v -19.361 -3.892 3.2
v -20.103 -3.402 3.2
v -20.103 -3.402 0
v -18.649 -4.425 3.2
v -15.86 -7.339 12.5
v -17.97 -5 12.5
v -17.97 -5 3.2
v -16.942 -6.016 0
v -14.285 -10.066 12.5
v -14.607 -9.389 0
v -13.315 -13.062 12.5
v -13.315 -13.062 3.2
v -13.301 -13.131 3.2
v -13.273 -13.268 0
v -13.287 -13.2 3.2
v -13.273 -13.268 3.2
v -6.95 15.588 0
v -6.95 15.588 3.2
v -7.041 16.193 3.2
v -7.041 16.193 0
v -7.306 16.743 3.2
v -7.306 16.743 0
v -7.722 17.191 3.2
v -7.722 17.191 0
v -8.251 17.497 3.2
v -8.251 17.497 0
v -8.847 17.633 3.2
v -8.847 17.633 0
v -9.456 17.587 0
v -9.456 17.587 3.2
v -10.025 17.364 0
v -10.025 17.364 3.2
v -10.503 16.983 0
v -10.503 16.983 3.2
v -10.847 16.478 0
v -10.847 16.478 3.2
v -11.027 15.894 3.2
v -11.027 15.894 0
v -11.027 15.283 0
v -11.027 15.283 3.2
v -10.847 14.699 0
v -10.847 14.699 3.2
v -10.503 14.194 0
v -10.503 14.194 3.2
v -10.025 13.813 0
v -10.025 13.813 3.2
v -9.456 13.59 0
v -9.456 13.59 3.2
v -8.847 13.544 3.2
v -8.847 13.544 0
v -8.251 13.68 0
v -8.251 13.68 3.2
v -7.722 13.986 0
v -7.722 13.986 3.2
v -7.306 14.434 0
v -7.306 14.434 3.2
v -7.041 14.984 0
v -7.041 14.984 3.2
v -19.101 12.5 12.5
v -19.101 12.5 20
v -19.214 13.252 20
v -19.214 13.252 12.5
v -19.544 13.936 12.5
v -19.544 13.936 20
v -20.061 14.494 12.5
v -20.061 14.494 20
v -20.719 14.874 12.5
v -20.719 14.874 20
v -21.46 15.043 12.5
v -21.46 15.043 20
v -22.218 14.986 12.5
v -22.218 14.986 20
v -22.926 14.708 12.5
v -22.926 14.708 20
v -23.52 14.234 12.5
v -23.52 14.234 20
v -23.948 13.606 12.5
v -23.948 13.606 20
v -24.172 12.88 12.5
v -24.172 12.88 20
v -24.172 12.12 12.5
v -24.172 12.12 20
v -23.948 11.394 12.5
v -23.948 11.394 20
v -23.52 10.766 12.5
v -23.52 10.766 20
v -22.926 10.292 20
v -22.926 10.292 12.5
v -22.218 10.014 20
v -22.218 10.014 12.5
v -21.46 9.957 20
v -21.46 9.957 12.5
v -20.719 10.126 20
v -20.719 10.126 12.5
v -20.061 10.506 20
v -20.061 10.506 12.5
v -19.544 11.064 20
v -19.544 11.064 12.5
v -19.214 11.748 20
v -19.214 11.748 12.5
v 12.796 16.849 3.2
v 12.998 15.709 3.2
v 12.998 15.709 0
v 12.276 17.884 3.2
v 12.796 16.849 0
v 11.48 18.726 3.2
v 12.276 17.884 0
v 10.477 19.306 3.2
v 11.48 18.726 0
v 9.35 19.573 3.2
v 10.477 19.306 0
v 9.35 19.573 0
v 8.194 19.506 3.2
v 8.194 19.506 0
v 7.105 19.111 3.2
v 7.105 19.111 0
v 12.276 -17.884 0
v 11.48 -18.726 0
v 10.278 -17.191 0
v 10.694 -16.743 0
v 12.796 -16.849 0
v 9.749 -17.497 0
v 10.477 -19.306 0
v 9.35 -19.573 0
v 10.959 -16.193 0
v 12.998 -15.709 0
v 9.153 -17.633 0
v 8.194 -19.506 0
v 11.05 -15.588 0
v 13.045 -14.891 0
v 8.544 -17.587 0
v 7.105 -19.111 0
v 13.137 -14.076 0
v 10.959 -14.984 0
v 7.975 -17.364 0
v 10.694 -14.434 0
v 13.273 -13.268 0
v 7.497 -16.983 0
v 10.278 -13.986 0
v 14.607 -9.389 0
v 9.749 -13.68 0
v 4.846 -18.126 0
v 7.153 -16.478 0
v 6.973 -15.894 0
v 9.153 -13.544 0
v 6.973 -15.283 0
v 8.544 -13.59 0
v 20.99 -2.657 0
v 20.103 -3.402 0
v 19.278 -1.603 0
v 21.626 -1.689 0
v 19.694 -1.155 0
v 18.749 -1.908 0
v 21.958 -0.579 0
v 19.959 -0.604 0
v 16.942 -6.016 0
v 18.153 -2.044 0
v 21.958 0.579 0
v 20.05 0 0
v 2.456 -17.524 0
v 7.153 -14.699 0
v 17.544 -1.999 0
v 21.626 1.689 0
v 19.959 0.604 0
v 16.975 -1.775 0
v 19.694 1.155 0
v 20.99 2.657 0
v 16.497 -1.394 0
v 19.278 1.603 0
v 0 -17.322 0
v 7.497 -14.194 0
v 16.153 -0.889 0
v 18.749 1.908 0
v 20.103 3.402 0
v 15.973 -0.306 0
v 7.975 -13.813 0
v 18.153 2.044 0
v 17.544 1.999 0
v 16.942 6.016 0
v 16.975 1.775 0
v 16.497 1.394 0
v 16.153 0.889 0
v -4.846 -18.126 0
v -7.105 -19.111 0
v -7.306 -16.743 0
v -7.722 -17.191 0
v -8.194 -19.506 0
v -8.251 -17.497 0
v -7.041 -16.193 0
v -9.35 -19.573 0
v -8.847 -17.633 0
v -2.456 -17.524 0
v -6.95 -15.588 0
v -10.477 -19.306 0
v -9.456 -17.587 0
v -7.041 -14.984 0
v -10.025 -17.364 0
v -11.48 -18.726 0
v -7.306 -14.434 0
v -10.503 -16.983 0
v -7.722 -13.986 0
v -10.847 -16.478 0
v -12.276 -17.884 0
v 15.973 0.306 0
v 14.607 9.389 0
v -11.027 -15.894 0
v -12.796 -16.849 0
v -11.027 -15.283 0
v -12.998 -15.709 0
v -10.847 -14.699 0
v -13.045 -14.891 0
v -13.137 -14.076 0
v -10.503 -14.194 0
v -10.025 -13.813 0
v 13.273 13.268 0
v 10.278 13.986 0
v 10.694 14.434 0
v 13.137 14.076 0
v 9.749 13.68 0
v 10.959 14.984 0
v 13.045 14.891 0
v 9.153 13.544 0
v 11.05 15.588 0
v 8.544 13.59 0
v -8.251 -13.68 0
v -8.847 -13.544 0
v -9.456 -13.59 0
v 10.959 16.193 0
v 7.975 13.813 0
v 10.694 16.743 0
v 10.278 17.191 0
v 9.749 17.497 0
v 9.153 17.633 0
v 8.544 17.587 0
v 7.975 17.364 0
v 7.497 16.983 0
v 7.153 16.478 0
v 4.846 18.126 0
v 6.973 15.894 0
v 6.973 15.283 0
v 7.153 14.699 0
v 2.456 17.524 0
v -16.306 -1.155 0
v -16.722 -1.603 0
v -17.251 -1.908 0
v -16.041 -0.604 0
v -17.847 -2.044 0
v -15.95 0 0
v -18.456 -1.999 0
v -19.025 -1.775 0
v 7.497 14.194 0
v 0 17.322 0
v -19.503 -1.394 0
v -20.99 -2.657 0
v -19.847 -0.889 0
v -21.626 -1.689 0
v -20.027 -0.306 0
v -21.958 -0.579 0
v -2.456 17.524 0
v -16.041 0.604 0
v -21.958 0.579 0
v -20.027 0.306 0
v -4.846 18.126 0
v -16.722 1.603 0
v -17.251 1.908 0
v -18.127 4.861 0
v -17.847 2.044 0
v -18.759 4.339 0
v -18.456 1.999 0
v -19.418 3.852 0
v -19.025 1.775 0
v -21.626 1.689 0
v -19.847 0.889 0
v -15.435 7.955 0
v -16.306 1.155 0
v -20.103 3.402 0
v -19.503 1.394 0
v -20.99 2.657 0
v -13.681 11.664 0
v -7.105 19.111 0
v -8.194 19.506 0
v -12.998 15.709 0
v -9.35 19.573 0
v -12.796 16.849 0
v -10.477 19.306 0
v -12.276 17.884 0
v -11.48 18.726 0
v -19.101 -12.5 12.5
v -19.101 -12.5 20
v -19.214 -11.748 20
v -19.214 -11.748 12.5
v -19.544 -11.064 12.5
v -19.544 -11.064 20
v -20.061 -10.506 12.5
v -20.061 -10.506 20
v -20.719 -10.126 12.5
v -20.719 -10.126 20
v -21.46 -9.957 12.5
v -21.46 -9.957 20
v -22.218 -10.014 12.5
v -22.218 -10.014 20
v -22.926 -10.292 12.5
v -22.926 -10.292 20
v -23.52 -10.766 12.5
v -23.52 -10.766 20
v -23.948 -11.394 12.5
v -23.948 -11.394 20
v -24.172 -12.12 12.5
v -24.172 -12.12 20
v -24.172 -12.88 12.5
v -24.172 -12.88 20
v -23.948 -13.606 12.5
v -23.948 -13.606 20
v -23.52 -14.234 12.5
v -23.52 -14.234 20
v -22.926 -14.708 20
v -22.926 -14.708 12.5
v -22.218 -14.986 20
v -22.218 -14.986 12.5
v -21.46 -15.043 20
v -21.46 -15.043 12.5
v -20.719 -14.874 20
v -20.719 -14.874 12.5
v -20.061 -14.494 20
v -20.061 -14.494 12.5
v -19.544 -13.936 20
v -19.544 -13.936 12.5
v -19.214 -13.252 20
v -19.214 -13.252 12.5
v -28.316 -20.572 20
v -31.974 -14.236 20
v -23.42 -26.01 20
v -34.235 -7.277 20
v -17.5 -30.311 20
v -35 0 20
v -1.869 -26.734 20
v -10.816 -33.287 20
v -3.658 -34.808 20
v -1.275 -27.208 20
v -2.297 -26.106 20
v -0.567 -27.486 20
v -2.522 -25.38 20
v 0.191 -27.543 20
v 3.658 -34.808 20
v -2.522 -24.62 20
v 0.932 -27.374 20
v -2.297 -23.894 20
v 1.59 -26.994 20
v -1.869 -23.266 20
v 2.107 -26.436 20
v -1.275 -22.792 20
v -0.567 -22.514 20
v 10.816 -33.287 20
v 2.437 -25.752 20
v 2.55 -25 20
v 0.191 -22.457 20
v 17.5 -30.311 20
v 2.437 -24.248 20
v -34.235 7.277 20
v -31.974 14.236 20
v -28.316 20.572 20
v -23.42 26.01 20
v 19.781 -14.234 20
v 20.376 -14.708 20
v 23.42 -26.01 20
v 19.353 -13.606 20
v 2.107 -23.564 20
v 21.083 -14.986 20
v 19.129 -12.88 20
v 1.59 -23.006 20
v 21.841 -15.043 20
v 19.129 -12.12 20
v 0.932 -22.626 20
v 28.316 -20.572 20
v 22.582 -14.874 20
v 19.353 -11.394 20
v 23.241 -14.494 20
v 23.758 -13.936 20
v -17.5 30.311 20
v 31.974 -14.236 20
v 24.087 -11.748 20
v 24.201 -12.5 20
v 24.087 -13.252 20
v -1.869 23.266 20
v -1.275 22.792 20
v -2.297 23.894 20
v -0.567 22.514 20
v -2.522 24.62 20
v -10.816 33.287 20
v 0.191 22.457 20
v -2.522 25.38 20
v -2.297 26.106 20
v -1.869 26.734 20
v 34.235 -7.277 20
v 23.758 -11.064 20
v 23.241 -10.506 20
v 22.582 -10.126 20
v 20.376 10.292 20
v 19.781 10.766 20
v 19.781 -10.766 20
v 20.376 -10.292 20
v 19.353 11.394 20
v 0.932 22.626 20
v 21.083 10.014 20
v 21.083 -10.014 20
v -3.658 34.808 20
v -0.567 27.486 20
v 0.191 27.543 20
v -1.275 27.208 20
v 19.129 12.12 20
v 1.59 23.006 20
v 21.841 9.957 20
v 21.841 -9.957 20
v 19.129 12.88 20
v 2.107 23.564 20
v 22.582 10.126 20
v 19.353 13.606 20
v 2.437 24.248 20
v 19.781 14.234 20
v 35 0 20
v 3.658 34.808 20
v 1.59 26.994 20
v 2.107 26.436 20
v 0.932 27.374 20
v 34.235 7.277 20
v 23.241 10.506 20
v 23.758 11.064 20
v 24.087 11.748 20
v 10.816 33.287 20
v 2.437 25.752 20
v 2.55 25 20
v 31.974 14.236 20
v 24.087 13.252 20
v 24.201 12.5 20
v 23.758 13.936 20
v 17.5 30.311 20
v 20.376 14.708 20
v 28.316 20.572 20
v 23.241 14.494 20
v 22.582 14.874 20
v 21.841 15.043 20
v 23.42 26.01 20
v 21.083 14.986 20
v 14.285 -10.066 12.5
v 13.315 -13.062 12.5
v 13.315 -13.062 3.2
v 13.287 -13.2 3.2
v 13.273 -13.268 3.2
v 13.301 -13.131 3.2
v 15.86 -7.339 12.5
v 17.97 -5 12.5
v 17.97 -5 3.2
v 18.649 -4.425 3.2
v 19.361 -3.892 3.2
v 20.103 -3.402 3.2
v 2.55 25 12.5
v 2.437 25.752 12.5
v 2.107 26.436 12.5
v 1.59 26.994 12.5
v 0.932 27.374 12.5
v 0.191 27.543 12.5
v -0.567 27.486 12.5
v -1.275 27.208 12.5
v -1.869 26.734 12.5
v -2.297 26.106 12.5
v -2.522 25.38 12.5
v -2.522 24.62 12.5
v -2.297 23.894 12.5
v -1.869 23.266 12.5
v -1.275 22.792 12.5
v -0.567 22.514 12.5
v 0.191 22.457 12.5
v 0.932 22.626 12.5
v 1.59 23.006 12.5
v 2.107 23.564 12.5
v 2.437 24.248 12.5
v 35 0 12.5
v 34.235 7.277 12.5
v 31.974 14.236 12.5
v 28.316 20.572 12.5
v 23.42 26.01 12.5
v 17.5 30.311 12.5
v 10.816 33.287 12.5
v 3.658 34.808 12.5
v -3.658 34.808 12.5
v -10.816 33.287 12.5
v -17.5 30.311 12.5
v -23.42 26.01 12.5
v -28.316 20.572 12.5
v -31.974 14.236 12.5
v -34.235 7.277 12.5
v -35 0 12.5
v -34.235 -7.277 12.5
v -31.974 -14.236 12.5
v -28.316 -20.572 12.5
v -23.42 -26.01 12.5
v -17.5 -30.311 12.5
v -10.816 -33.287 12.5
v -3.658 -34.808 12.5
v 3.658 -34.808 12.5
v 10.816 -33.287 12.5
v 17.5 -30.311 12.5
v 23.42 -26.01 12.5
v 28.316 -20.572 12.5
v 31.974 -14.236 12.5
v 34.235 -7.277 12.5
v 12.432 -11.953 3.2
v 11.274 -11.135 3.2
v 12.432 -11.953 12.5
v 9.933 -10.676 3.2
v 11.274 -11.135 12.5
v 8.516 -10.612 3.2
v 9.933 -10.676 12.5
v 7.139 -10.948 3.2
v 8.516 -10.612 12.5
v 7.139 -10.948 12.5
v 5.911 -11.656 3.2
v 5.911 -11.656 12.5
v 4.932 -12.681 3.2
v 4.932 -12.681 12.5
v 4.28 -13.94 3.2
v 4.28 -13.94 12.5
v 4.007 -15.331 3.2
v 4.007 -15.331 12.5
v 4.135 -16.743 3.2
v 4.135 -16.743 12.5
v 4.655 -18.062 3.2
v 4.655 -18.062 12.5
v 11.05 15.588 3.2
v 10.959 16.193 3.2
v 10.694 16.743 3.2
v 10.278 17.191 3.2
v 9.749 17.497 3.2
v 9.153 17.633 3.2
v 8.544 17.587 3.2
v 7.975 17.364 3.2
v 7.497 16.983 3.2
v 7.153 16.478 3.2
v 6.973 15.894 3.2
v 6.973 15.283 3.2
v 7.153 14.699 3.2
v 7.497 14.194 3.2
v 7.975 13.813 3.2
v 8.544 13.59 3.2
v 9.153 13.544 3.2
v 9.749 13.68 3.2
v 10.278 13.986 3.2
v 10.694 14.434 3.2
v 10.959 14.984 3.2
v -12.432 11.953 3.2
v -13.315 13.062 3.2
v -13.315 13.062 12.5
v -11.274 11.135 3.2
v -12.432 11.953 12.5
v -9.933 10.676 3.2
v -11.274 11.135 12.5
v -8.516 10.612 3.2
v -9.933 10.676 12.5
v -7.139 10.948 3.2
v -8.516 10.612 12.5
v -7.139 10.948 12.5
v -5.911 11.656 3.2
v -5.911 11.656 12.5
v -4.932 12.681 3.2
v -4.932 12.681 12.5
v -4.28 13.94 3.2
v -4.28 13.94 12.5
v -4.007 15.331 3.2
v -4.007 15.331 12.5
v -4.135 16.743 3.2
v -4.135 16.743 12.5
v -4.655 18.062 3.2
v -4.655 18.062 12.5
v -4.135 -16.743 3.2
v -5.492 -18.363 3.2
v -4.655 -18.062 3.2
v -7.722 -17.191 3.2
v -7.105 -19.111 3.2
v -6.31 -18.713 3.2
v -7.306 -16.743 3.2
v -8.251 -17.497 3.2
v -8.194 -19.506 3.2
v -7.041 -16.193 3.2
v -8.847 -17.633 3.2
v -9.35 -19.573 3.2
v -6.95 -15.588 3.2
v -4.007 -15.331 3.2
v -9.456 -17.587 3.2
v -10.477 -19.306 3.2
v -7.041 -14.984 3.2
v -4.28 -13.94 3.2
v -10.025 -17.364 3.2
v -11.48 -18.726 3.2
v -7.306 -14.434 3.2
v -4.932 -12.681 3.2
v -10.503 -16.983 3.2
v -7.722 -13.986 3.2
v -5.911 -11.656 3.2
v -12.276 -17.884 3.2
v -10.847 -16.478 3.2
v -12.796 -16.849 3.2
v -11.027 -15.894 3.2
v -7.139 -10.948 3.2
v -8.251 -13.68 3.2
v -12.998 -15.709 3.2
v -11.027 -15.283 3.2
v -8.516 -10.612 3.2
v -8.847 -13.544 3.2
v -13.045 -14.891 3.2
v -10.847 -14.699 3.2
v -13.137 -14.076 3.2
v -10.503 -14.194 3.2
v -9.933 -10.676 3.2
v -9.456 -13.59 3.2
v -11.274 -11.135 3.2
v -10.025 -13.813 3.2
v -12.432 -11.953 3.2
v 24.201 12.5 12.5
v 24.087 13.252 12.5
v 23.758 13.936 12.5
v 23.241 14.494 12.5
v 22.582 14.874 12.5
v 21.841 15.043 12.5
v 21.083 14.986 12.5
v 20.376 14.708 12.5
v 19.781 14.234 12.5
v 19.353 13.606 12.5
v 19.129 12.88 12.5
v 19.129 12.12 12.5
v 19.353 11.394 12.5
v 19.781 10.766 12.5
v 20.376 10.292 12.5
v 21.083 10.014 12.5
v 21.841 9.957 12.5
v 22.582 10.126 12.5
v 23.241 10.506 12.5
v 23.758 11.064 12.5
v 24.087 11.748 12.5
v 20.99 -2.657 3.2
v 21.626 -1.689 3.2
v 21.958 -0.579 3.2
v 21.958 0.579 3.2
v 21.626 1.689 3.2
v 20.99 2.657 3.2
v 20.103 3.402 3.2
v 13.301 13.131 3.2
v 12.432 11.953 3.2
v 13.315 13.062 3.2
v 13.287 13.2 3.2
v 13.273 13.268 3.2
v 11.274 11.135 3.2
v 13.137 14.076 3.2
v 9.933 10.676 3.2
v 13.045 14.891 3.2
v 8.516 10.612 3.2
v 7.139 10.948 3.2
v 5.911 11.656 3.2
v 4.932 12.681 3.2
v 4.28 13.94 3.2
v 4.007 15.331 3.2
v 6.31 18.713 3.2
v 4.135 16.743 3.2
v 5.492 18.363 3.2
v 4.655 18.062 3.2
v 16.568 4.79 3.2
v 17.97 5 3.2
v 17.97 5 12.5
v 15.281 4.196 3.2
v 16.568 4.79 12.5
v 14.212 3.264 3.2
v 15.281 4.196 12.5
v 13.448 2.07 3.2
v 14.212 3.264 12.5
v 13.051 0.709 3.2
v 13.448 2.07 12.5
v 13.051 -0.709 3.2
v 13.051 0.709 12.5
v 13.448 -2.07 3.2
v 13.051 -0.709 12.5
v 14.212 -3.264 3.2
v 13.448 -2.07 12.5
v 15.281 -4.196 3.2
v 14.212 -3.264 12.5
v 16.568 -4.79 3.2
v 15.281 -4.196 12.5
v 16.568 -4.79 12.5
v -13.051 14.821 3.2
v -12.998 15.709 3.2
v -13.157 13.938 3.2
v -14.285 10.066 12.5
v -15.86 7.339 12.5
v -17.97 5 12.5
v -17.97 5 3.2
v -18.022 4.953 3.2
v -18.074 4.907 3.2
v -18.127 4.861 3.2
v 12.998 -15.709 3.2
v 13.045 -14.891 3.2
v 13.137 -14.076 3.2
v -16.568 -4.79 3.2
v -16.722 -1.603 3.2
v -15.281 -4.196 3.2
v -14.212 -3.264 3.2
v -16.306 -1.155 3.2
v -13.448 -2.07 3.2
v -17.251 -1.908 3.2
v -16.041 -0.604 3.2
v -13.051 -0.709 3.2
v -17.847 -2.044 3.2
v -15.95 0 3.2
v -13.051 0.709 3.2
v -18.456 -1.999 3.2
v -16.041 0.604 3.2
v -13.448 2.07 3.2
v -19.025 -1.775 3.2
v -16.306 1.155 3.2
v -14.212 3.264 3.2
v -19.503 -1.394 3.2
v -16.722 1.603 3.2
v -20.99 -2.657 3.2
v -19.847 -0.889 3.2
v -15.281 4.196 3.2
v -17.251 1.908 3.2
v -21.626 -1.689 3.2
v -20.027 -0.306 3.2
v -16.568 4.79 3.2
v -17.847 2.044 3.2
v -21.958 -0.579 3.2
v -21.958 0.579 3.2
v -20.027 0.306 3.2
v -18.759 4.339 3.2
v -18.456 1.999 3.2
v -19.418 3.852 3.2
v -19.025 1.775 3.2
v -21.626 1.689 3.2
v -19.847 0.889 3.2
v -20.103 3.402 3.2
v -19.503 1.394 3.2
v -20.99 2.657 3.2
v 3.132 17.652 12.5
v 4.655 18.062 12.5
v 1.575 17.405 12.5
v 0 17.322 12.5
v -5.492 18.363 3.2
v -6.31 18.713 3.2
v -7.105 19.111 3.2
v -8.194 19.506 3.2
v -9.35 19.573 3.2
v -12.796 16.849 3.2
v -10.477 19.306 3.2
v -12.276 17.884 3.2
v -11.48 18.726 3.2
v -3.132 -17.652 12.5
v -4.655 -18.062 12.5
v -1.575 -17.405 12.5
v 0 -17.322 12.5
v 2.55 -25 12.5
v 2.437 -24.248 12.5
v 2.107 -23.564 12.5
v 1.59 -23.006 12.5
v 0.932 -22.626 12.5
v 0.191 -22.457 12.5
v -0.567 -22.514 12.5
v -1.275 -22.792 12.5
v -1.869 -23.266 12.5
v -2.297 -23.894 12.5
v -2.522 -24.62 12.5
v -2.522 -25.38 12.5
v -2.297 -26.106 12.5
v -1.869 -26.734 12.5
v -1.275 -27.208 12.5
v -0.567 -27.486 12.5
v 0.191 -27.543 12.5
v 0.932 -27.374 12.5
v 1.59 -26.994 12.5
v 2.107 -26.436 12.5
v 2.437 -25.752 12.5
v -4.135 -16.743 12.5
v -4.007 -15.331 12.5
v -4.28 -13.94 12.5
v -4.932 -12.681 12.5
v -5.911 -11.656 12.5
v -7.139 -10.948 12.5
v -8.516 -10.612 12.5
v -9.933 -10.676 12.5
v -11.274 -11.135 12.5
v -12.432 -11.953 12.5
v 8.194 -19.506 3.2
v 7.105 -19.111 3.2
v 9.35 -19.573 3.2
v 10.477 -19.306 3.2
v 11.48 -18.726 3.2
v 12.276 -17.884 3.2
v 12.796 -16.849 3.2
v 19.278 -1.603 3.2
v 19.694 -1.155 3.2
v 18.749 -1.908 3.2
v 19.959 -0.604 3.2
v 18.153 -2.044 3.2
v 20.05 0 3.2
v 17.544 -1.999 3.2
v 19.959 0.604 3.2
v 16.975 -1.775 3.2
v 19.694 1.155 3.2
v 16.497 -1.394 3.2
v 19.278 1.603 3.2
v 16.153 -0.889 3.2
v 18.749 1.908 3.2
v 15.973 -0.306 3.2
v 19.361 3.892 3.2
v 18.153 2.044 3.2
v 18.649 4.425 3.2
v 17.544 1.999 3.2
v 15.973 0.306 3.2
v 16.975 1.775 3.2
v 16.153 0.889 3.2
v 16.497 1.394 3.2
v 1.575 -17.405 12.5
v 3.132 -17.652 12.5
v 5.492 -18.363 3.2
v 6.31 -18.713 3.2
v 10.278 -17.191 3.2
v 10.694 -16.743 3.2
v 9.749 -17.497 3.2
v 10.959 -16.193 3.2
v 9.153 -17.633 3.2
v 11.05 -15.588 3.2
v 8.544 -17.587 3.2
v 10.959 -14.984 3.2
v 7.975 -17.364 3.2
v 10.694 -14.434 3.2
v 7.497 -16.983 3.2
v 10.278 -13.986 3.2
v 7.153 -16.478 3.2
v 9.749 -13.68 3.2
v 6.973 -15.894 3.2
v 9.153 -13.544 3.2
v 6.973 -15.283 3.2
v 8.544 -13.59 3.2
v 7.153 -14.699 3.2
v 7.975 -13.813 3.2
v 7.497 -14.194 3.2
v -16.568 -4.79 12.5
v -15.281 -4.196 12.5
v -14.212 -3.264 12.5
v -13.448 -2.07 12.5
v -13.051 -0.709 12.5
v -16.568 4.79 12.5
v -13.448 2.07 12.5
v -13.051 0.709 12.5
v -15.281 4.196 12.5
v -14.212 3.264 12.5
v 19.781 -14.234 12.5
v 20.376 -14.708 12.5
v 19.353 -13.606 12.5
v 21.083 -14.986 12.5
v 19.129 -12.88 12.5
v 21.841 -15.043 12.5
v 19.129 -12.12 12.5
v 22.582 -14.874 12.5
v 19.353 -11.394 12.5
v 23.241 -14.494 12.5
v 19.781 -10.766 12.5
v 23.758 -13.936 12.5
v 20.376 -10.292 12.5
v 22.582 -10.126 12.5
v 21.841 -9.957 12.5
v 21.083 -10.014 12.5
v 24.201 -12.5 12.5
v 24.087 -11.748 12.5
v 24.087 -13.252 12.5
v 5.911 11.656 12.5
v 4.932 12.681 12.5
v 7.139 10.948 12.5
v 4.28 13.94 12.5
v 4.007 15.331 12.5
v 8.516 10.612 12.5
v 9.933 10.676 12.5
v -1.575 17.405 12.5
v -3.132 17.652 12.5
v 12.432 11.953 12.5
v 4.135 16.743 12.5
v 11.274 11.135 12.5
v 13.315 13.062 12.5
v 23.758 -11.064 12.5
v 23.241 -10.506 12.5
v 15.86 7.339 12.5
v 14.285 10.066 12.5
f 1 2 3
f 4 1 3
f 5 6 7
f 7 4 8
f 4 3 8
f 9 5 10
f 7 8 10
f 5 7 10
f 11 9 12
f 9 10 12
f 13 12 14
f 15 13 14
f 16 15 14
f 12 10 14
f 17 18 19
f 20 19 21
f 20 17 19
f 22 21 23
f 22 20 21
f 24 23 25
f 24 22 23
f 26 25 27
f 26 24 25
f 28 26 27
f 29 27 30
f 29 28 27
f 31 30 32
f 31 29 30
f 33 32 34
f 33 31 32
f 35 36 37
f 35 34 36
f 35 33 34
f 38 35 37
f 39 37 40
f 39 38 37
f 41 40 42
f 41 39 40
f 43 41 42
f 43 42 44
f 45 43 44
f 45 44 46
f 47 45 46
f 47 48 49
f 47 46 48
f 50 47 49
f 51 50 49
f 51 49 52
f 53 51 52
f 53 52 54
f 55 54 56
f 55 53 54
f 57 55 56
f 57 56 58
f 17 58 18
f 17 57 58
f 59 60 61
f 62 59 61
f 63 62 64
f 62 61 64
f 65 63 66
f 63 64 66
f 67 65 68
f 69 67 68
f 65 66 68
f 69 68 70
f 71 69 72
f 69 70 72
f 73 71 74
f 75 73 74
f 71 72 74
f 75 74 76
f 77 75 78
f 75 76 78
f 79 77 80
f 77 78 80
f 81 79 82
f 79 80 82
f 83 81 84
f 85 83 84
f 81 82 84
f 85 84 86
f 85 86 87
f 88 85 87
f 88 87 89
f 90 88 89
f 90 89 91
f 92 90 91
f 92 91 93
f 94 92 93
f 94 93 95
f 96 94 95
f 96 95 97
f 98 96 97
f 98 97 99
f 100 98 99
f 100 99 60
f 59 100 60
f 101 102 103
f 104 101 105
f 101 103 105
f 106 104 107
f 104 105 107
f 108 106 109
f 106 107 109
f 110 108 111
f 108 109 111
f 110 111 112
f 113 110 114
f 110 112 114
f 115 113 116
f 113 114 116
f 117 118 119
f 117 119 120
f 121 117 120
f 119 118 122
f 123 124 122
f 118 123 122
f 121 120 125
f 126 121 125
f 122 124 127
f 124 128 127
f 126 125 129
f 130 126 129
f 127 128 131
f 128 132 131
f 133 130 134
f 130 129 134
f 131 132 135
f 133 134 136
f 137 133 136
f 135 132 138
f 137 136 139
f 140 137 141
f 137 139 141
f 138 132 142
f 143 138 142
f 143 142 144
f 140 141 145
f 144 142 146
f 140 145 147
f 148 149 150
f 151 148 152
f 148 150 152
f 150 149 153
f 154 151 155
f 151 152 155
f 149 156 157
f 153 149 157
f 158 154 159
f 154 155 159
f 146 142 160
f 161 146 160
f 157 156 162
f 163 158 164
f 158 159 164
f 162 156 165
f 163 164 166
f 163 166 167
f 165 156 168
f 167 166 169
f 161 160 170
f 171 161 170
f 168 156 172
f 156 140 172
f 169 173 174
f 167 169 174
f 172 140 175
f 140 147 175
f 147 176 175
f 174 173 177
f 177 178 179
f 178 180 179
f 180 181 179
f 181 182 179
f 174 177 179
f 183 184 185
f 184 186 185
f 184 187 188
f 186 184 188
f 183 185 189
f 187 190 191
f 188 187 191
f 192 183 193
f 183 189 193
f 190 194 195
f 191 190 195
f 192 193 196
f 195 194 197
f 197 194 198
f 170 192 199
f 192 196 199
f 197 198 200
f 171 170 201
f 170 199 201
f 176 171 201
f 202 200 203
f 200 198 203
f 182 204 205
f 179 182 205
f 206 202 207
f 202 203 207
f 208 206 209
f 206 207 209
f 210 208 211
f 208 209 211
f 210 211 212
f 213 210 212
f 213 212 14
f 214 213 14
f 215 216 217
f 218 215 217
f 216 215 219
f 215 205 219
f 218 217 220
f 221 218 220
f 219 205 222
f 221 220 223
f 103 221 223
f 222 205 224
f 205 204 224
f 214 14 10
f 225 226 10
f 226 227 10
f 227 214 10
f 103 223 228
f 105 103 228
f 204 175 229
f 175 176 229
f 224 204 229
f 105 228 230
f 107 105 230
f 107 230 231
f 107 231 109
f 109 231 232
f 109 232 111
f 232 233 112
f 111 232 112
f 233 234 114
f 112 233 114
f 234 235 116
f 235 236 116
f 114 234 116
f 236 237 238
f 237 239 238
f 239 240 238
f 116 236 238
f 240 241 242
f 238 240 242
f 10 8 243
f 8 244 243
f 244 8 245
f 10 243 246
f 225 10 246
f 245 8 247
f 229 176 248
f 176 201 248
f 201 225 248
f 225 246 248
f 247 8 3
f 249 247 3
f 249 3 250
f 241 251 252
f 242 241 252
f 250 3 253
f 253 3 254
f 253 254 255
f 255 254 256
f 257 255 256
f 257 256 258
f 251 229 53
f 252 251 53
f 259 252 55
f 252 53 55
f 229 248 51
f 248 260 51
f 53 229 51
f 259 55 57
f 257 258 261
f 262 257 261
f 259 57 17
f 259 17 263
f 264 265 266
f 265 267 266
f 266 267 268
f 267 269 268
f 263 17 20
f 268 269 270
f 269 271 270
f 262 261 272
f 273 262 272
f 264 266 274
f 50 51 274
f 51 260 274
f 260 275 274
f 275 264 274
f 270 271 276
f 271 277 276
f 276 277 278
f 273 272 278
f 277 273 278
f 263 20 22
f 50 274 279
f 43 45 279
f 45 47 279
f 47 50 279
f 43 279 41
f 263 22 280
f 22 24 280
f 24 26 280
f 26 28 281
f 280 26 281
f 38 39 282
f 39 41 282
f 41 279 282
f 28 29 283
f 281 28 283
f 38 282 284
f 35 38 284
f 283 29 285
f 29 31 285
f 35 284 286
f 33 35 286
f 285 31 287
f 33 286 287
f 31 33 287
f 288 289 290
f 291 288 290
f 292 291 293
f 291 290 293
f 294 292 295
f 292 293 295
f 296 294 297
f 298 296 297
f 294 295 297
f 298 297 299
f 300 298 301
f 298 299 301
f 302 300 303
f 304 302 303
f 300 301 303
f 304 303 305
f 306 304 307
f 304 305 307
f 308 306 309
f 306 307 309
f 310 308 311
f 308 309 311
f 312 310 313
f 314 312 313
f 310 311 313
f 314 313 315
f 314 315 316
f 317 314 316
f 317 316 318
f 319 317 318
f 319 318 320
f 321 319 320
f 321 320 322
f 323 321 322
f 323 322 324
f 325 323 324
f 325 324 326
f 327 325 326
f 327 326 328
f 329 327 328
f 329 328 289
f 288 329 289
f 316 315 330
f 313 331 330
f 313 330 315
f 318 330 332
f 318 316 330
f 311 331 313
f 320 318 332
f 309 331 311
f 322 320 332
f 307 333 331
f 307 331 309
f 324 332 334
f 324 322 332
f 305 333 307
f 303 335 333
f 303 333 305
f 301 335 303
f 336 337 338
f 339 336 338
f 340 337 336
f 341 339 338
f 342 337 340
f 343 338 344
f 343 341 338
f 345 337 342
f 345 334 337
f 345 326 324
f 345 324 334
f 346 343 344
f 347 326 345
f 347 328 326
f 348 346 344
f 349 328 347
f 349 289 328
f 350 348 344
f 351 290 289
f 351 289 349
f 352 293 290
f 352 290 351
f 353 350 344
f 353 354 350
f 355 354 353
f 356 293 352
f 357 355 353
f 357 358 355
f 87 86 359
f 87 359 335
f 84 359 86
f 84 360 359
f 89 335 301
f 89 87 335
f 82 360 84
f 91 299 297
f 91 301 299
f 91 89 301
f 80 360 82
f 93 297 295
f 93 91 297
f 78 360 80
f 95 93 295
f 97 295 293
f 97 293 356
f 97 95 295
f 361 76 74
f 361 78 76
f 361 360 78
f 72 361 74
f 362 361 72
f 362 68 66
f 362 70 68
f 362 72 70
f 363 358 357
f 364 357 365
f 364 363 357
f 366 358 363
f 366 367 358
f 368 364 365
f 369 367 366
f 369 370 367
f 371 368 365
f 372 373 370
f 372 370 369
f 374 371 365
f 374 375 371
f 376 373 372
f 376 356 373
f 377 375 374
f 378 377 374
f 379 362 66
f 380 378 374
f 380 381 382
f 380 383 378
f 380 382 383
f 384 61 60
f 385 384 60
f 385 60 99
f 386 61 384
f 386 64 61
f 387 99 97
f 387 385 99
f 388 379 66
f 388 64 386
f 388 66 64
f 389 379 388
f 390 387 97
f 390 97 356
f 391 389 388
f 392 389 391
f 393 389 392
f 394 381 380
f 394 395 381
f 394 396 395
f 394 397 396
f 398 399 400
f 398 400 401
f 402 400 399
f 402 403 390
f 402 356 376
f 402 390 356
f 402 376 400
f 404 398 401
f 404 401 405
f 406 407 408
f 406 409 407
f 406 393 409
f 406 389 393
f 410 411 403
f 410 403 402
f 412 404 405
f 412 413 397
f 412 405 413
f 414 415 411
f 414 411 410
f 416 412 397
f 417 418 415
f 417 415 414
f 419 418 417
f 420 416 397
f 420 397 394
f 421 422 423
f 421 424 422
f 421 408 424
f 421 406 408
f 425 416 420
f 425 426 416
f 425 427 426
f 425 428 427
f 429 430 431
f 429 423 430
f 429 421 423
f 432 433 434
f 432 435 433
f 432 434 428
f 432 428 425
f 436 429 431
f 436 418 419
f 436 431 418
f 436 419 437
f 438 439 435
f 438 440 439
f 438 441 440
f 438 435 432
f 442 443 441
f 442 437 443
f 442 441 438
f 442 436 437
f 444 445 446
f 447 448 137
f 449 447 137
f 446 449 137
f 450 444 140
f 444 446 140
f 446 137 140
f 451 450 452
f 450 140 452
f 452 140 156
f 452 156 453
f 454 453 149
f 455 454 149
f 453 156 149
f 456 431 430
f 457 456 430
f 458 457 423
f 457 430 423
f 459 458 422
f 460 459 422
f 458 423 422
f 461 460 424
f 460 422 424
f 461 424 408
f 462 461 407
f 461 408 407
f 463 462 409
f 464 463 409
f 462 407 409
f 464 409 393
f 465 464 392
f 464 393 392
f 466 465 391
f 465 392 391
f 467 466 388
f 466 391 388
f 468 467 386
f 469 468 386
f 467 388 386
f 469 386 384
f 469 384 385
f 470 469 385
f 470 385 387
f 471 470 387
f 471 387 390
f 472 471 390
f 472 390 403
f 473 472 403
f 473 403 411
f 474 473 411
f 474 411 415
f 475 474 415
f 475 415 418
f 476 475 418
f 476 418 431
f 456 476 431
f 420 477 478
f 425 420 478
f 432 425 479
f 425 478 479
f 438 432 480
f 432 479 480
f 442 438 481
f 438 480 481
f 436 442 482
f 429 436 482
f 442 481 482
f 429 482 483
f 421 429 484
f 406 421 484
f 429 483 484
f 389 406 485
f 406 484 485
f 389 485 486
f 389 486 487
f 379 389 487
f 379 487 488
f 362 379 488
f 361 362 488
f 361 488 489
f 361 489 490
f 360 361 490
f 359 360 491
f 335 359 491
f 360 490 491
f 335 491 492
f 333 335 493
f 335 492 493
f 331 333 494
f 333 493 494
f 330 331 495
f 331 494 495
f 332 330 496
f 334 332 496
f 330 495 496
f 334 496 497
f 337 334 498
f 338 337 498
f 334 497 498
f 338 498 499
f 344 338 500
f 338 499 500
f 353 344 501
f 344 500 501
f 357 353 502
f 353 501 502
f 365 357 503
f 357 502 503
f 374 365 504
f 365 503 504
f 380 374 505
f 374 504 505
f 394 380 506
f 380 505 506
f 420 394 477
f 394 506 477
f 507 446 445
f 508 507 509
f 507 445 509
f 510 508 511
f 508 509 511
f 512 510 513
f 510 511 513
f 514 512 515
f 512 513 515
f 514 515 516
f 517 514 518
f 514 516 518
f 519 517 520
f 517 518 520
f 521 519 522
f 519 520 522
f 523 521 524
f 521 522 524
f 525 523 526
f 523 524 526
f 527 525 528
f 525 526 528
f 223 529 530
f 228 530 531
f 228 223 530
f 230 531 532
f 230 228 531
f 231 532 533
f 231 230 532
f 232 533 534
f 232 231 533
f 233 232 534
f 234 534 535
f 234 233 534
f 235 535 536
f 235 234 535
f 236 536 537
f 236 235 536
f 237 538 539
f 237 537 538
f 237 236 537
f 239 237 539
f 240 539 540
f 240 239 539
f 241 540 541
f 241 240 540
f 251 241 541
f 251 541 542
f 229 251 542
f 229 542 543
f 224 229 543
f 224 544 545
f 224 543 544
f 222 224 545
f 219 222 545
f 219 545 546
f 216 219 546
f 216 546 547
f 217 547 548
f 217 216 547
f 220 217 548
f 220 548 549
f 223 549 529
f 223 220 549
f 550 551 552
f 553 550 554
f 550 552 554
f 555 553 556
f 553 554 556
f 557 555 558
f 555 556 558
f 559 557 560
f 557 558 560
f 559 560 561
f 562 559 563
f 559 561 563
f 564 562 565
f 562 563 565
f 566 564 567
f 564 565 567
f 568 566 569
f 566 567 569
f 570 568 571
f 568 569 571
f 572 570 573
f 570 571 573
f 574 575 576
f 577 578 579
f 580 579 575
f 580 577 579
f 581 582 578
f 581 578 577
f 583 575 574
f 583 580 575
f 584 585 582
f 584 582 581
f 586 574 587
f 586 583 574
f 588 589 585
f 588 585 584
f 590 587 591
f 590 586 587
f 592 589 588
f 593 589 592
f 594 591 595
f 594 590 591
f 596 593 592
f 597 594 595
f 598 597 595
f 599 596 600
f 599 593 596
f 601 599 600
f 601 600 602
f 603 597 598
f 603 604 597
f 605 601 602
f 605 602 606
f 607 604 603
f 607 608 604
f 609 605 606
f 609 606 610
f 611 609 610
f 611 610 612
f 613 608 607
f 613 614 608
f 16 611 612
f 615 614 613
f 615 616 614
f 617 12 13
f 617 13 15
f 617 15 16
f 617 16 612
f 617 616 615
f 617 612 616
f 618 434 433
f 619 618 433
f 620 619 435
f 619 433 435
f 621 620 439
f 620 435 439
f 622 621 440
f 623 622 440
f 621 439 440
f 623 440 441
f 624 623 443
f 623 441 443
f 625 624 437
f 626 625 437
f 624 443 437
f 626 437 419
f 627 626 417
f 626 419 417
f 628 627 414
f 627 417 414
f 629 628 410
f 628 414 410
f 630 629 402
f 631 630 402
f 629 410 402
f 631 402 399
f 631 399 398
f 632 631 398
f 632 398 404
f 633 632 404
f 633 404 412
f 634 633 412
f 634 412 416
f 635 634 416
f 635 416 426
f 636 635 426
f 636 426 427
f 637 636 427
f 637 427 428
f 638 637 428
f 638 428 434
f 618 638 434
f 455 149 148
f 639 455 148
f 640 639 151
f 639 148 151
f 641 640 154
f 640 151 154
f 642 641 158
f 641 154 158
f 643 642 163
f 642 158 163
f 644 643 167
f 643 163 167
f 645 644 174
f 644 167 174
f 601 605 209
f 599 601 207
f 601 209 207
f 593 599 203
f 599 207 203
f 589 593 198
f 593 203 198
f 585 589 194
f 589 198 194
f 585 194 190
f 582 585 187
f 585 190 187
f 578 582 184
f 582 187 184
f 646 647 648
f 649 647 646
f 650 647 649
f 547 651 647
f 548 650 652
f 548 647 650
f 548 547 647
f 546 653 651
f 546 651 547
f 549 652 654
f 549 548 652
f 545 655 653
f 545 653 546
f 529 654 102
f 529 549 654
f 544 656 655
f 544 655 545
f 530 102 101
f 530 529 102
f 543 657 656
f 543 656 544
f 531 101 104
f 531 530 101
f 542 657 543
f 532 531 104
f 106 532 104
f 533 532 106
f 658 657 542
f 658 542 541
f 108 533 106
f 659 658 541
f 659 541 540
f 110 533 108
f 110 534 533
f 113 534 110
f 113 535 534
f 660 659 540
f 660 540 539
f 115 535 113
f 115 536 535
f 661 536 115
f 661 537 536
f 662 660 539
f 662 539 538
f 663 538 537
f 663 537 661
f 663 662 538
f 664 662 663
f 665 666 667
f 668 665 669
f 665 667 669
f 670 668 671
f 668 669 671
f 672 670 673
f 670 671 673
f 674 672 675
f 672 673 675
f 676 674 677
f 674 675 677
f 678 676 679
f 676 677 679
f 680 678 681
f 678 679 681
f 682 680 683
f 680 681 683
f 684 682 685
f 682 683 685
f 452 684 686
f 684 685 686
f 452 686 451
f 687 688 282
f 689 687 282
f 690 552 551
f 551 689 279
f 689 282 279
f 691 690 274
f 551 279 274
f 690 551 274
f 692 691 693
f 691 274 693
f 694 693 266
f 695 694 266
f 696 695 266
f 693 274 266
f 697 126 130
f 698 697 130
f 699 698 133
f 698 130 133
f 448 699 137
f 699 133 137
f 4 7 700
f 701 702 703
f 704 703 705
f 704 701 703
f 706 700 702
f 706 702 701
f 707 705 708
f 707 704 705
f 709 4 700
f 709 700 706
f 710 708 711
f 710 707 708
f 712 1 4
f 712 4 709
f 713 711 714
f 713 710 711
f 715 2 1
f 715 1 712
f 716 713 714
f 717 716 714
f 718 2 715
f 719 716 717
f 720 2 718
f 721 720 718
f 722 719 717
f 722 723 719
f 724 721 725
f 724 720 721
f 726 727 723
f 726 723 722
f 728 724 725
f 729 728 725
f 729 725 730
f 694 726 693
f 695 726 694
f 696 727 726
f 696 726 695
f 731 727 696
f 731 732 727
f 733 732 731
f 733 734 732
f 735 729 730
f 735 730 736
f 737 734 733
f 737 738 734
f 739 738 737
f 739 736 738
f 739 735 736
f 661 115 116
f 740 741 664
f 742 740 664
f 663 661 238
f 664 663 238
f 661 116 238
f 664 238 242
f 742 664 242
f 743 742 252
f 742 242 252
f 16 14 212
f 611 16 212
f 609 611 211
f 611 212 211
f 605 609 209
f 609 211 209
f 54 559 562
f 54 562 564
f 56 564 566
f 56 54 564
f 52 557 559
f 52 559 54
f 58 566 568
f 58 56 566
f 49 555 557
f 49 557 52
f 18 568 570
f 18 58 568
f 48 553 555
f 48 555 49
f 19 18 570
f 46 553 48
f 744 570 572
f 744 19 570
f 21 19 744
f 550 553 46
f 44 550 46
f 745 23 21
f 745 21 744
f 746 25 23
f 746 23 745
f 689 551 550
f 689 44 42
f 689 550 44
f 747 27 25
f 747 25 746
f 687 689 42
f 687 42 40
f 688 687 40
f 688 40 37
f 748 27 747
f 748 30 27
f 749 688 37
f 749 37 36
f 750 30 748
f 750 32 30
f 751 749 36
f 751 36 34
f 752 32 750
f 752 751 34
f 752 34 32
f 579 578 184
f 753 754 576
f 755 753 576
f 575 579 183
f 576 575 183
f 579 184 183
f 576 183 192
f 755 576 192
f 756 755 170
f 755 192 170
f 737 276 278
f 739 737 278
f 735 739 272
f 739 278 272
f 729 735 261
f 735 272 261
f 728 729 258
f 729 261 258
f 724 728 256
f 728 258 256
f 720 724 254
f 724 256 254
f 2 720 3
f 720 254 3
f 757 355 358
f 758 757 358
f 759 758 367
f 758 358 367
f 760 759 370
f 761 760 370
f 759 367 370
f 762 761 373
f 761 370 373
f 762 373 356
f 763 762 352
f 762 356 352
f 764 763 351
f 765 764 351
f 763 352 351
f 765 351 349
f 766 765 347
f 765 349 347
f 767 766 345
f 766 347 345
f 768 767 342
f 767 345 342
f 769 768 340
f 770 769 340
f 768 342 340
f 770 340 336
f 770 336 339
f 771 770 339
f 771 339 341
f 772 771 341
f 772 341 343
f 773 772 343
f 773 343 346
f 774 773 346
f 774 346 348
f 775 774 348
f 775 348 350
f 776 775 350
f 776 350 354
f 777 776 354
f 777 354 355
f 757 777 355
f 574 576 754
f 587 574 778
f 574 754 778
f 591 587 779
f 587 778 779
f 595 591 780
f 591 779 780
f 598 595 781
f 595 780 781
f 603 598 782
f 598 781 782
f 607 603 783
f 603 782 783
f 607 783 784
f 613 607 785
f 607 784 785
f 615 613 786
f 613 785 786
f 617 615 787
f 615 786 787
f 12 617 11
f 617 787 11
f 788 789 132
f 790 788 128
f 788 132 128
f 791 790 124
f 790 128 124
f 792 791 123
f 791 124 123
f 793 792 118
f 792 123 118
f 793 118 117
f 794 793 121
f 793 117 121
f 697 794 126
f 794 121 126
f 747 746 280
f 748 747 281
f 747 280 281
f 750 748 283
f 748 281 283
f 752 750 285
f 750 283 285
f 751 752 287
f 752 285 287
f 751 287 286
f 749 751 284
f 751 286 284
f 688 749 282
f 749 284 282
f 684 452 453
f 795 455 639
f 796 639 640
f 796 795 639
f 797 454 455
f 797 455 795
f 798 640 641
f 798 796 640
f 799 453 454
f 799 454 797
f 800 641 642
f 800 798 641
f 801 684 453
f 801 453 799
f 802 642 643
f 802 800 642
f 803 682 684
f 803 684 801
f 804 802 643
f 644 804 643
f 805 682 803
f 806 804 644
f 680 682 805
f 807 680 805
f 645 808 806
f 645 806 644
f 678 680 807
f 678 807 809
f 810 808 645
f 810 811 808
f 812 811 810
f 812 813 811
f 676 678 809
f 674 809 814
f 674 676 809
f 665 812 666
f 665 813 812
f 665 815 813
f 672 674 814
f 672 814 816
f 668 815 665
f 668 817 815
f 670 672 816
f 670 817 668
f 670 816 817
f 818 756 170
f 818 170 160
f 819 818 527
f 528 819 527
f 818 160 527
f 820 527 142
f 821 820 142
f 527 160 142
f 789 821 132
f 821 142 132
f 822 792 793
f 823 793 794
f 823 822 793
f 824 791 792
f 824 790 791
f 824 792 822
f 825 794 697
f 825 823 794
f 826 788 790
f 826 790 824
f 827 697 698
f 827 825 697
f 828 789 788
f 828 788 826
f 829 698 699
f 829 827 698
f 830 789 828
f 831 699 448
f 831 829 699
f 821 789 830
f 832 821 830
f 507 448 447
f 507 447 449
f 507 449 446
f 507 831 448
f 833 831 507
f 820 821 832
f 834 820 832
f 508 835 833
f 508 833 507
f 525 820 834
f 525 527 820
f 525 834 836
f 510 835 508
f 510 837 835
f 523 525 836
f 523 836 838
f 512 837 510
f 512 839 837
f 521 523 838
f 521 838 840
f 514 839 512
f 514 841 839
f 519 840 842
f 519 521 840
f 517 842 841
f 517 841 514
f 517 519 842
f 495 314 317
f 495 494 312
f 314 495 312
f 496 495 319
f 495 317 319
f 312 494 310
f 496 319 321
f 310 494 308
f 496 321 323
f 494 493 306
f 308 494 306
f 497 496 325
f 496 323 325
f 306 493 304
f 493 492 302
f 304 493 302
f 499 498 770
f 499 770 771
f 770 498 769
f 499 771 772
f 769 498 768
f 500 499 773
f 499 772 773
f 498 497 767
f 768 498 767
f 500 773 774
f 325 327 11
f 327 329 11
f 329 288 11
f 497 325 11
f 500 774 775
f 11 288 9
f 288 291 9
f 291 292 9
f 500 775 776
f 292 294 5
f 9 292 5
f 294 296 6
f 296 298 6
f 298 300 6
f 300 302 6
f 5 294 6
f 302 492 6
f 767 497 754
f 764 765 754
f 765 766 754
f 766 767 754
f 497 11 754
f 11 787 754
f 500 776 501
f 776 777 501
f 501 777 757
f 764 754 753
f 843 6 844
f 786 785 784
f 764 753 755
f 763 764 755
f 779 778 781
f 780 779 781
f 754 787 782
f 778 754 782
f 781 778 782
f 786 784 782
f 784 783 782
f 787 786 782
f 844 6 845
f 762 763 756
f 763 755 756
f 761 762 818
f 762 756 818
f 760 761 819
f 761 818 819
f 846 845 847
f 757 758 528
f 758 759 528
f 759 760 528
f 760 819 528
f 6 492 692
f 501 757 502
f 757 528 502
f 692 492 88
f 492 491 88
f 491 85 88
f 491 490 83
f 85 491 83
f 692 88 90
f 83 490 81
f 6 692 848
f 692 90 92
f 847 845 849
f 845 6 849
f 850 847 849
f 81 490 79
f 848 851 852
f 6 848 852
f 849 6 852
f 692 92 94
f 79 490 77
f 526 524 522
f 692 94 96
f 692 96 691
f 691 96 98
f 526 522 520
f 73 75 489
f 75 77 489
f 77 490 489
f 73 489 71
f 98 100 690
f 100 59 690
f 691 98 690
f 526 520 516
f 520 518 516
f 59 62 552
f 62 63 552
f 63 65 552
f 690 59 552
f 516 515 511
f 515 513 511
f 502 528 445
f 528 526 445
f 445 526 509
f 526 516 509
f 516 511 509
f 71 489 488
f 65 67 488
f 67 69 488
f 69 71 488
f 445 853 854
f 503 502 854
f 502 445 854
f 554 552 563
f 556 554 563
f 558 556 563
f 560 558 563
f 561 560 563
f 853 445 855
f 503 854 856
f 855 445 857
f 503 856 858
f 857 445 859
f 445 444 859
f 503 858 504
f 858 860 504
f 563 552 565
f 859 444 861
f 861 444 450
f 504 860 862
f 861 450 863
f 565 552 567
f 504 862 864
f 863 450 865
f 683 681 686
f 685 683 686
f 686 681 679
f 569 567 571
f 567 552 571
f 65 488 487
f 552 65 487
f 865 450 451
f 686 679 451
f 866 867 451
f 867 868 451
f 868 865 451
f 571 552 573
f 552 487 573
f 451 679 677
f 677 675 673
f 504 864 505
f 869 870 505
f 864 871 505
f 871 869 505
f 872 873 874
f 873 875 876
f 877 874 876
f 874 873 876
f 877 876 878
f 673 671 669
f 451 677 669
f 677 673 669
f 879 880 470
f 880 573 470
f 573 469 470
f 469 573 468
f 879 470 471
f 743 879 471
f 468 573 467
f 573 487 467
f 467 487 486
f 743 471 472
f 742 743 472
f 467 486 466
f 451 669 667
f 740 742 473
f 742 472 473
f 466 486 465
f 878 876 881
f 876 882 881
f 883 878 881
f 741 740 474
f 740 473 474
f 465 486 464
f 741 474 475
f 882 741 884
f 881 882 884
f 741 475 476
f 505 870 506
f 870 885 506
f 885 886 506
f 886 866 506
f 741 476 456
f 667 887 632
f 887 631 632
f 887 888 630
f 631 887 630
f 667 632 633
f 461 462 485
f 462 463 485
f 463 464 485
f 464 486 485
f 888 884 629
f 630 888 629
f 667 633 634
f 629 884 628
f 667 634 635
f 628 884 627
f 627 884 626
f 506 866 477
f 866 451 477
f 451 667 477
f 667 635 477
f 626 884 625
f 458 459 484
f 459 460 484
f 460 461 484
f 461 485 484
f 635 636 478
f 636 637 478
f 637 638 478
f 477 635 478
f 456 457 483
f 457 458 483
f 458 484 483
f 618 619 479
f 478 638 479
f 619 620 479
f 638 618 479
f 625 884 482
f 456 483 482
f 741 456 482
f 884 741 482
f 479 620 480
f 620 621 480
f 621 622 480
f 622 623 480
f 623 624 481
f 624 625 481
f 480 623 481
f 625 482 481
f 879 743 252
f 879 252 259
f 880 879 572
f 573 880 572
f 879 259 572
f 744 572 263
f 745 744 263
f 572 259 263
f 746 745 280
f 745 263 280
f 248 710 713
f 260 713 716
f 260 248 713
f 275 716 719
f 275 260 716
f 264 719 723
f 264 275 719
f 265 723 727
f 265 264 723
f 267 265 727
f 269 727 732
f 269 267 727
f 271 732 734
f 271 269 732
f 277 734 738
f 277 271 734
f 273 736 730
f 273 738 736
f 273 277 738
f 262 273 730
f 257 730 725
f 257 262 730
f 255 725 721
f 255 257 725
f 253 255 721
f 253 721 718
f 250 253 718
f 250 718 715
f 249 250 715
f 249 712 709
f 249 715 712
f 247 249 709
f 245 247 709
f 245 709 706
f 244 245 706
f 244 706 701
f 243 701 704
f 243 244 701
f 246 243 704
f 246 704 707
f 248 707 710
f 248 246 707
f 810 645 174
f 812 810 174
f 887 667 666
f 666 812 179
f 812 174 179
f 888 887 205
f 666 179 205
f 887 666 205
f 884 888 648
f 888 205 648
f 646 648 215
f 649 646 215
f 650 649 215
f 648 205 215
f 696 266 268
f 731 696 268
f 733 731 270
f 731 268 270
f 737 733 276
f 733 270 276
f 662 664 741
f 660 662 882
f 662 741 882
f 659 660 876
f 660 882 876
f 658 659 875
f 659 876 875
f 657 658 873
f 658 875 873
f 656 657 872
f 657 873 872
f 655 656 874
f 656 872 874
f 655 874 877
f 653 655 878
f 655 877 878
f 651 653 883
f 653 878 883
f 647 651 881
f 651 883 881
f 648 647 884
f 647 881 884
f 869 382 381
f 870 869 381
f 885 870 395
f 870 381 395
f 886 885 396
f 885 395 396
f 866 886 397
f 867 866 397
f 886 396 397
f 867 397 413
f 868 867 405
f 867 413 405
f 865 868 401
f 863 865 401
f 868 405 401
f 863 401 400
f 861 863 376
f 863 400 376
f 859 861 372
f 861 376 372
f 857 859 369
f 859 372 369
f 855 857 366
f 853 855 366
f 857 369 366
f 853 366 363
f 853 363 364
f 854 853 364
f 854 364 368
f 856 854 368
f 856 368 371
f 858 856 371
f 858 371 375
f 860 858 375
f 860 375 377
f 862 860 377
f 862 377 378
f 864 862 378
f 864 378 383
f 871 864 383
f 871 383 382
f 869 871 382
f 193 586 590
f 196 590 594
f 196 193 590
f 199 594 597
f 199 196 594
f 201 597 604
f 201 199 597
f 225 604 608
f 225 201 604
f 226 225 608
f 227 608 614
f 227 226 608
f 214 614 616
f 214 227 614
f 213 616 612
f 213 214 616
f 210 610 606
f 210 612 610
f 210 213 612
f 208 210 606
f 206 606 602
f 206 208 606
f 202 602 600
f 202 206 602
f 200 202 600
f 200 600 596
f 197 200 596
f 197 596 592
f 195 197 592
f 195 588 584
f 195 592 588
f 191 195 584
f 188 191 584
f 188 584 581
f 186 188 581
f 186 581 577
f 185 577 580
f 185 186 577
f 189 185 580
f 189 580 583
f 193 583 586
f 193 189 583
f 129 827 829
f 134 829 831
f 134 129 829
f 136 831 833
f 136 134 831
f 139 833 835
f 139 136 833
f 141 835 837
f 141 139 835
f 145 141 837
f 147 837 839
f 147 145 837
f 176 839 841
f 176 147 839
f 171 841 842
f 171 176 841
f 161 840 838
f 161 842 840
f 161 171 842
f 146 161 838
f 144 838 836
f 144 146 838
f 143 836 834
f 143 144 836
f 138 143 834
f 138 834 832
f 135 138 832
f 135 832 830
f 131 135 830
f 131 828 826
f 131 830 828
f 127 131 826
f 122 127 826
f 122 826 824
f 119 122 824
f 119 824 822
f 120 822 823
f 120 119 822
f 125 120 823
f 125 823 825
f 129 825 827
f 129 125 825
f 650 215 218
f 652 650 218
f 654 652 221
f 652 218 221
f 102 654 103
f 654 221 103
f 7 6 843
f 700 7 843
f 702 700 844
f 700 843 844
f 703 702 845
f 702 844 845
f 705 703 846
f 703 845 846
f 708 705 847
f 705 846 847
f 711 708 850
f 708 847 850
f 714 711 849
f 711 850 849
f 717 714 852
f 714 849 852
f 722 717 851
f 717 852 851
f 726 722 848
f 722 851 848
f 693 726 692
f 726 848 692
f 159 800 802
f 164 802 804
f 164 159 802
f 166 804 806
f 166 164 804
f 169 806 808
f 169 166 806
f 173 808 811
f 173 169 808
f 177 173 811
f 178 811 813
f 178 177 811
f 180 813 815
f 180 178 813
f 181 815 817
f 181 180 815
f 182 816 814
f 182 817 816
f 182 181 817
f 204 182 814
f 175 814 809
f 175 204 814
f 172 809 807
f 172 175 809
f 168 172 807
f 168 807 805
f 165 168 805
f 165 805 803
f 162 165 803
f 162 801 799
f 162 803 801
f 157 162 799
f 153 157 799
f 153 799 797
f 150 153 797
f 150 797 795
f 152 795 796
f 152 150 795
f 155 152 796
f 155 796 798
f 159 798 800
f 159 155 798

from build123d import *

# Parameters (mm, degrees)
BOSS_EXTRUDE1_DEPTH = 12.5
CUT_EXTRUDE1_START  = 12.5
SKETCH4_R           = 5
CUT_EXTRUDE1_DEPTH  = 9.3
BOSS_EXTRUDE2_START = 12.5
SKETCH6_R           = 35
BOSS_EXTRUDE2_DEPTH = 7.5
CUT_EXTRUDE5_START  = 20
SKETCH9_R           = 2.55
CUT_EXTRUDE5_DEPTH  = 12
SKETCH5_R           = 2.05
CUT_EXTRUDE6_DEPTH  = 10


with BuildPart() as part:
    # Sketch2 → Boss-Extrude1 (new body)
    with BuildSketch(Plane(origin=(0, 0, 0), x_dir=(0, 1, 0), z_dir=(0, 0, 1))):
        with BuildLine():
            ThreePointArc((3.402279768, 20.103447736), (0, 22), (-3.402279768, 20.103447736))
            ThreePointArc((-3.402279768, 20.103447736), (-7.622462843, 15.658643671), (-13.268220181, 13.272925238))
            ThreePointArc((-13.268220181, 13.272925238), (-14.482955544, 13.085514107), (-15.708956559, 12.998184578))
            ThreePointArc((-15.708956559, 12.998184578), (-19.052558883, 11), (-19.111236327, 7.105263158))
            ThreePointArc((-19.111236327, 7.105263158), (-17.775931243, 3.663582804), (-17.321657799, 0))
            ThreePointArc((-17.321657799, 0), (-17.775931243, -3.663582804), (-19.111236327, -7.105263158))
            ThreePointArc((-19.111236327, -7.105263158), (-19.052558883, -11), (-15.708956559, -12.998184578))
            ThreePointArc((-15.708956559, -12.998184578), (-14.482955544, -13.085514107), (-13.268220181, -13.272925238))
            ThreePointArc((-13.268220181, -13.272925238), (-7.622462843, -15.658643671), (-3.402279768, -20.103447736))
            ThreePointArc((-3.402279768, -20.103447736), (0, -22), (3.402279768, -20.103447736))
            ThreePointArc((3.402279768, -20.103447736), (7.622462843, -15.658643671), (13.268220181, -13.272925238))
            ThreePointArc((13.268220181, -13.272925238), (14.482955544, -13.085514107), (15.708956559, -12.998184578))
            ThreePointArc((15.708956559, -12.998184578), (19.052558883, -11), (19.111236327, -7.105263158))
            ThreePointArc((19.111236327, -7.105263158), (17.775931243, -3.663582804), (17.321657799, 0))
            ThreePointArc((17.321657799, 0), (17.775931243, 3.663582804), (19.111236327, 7.105263158))
            ThreePointArc((19.111236327, 7.105263158), (19.052558883, 11), (15.708956559, 12.998184578))
            ThreePointArc((15.708956559, 12.998184578), (9.749551787, 14.430568297), (4.860580348, 18.127078359))
            ThreePointArc((4.860580348, 18.127078359), (4.090909866, 19.085364477), (3.402279768, 20.103447736))
        make_face()
    extrude(amount=BOSS_EXTRUDE1_DEPTH)

    # Sketch4 → Cut-Extrude1 (cut)
    with BuildSketch(Plane(origin=(0, 0, 0), x_dir=(0, 1, 0), z_dir=(0, 0, 1)).offset(CUT_EXTRUDE1_START)):
        with Locations((-15.588457268, 9)):
            Circle(SKETCH4_R)
        with Locations((0, 18)):
            Circle(SKETCH4_R)
        with Locations((15.588457268, 9)):
            Circle(SKETCH4_R)
        with Locations((15.588457268, -9)):
            Circle(SKETCH4_R)
        with Locations((0, -18)):
            Circle(SKETCH4_R)
        with Locations((-15.588457268, -9)):
            Circle(SKETCH4_R)
    extrude(amount=-CUT_EXTRUDE1_DEPTH, mode=Mode.SUBTRACT)

    # Sketch6 → Boss-Extrude2 (add)
    with BuildSketch(Plane(origin=(0, 0, 0), x_dir=(0, 1, 0), z_dir=(0, 0, 1)).offset(BOSS_EXTRUDE2_START)):
        with Locations(Location((0, 0, 0), (0, 0, 270))):
            Circle(SKETCH6_R)
    extrude(amount=BOSS_EXTRUDE2_DEPTH)

    # Sketch9 → Cut-Extrude5 (cut)
    with BuildSketch(Plane(origin=(0, 0, 0), x_dir=(0, 1, 0), z_dir=(0, 0, 1)).offset(CUT_EXTRUDE5_START)):
        with Locations(Location((12.5, 21.650635095, 0), (0, 0, 270))):
            Circle(SKETCH9_R)
        with Locations(Location((25, 0, 0), (0, 0, 270))):
            Circle(SKETCH9_R)
        with Locations(Location((12.5, -21.650635095, 0), (0, 0, 270))):
            Circle(SKETCH9_R)
        with Locations(Location((-12.5, -21.650635095, 0), (0, 0, 270))):
            Circle(SKETCH9_R)
        with Locations(Location((-25, 0, 0), (0, 0, 270))):
            Circle(SKETCH9_R)
        with Locations(Location((-12.5, 21.650635095, 0), (0, 0, 270))):
            Circle(SKETCH9_R)
    extrude(amount=-CUT_EXTRUDE5_DEPTH, mode=Mode.SUBTRACT)

    # Sketch5 → Cut-Extrude6 (cut)
    with BuildSketch(Plane(origin=(0, 0, 0), x_dir=(0, 1, 0), z_dir=(0, 0, 1))):
        with Locations(Location((-15.588457268, 9, 0), (0, 0, 270))):
            Circle(SKETCH5_R)
        with Locations(Location((0, 18, 0), (0, 0, 270))):
            Circle(SKETCH5_R)
        with Locations(Location((15.588457268, 9, 0), (0, 0, 270))):
            Circle(SKETCH5_R)
        with Locations(Location((15.588457268, -9, 0), (0, 0, 270))):
            Circle(SKETCH5_R)
        with Locations(Location((0, -18, 0), (0, 0, 270))):
            Circle(SKETCH5_R)
        with Locations(Location((-15.588457268, -9, 0), (0, 0, 270))):
            Circle(SKETCH5_R)
    extrude(amount=CUT_EXTRUDE6_DEPTH, mode=Mode.SUBTRACT)


solid = part.part
